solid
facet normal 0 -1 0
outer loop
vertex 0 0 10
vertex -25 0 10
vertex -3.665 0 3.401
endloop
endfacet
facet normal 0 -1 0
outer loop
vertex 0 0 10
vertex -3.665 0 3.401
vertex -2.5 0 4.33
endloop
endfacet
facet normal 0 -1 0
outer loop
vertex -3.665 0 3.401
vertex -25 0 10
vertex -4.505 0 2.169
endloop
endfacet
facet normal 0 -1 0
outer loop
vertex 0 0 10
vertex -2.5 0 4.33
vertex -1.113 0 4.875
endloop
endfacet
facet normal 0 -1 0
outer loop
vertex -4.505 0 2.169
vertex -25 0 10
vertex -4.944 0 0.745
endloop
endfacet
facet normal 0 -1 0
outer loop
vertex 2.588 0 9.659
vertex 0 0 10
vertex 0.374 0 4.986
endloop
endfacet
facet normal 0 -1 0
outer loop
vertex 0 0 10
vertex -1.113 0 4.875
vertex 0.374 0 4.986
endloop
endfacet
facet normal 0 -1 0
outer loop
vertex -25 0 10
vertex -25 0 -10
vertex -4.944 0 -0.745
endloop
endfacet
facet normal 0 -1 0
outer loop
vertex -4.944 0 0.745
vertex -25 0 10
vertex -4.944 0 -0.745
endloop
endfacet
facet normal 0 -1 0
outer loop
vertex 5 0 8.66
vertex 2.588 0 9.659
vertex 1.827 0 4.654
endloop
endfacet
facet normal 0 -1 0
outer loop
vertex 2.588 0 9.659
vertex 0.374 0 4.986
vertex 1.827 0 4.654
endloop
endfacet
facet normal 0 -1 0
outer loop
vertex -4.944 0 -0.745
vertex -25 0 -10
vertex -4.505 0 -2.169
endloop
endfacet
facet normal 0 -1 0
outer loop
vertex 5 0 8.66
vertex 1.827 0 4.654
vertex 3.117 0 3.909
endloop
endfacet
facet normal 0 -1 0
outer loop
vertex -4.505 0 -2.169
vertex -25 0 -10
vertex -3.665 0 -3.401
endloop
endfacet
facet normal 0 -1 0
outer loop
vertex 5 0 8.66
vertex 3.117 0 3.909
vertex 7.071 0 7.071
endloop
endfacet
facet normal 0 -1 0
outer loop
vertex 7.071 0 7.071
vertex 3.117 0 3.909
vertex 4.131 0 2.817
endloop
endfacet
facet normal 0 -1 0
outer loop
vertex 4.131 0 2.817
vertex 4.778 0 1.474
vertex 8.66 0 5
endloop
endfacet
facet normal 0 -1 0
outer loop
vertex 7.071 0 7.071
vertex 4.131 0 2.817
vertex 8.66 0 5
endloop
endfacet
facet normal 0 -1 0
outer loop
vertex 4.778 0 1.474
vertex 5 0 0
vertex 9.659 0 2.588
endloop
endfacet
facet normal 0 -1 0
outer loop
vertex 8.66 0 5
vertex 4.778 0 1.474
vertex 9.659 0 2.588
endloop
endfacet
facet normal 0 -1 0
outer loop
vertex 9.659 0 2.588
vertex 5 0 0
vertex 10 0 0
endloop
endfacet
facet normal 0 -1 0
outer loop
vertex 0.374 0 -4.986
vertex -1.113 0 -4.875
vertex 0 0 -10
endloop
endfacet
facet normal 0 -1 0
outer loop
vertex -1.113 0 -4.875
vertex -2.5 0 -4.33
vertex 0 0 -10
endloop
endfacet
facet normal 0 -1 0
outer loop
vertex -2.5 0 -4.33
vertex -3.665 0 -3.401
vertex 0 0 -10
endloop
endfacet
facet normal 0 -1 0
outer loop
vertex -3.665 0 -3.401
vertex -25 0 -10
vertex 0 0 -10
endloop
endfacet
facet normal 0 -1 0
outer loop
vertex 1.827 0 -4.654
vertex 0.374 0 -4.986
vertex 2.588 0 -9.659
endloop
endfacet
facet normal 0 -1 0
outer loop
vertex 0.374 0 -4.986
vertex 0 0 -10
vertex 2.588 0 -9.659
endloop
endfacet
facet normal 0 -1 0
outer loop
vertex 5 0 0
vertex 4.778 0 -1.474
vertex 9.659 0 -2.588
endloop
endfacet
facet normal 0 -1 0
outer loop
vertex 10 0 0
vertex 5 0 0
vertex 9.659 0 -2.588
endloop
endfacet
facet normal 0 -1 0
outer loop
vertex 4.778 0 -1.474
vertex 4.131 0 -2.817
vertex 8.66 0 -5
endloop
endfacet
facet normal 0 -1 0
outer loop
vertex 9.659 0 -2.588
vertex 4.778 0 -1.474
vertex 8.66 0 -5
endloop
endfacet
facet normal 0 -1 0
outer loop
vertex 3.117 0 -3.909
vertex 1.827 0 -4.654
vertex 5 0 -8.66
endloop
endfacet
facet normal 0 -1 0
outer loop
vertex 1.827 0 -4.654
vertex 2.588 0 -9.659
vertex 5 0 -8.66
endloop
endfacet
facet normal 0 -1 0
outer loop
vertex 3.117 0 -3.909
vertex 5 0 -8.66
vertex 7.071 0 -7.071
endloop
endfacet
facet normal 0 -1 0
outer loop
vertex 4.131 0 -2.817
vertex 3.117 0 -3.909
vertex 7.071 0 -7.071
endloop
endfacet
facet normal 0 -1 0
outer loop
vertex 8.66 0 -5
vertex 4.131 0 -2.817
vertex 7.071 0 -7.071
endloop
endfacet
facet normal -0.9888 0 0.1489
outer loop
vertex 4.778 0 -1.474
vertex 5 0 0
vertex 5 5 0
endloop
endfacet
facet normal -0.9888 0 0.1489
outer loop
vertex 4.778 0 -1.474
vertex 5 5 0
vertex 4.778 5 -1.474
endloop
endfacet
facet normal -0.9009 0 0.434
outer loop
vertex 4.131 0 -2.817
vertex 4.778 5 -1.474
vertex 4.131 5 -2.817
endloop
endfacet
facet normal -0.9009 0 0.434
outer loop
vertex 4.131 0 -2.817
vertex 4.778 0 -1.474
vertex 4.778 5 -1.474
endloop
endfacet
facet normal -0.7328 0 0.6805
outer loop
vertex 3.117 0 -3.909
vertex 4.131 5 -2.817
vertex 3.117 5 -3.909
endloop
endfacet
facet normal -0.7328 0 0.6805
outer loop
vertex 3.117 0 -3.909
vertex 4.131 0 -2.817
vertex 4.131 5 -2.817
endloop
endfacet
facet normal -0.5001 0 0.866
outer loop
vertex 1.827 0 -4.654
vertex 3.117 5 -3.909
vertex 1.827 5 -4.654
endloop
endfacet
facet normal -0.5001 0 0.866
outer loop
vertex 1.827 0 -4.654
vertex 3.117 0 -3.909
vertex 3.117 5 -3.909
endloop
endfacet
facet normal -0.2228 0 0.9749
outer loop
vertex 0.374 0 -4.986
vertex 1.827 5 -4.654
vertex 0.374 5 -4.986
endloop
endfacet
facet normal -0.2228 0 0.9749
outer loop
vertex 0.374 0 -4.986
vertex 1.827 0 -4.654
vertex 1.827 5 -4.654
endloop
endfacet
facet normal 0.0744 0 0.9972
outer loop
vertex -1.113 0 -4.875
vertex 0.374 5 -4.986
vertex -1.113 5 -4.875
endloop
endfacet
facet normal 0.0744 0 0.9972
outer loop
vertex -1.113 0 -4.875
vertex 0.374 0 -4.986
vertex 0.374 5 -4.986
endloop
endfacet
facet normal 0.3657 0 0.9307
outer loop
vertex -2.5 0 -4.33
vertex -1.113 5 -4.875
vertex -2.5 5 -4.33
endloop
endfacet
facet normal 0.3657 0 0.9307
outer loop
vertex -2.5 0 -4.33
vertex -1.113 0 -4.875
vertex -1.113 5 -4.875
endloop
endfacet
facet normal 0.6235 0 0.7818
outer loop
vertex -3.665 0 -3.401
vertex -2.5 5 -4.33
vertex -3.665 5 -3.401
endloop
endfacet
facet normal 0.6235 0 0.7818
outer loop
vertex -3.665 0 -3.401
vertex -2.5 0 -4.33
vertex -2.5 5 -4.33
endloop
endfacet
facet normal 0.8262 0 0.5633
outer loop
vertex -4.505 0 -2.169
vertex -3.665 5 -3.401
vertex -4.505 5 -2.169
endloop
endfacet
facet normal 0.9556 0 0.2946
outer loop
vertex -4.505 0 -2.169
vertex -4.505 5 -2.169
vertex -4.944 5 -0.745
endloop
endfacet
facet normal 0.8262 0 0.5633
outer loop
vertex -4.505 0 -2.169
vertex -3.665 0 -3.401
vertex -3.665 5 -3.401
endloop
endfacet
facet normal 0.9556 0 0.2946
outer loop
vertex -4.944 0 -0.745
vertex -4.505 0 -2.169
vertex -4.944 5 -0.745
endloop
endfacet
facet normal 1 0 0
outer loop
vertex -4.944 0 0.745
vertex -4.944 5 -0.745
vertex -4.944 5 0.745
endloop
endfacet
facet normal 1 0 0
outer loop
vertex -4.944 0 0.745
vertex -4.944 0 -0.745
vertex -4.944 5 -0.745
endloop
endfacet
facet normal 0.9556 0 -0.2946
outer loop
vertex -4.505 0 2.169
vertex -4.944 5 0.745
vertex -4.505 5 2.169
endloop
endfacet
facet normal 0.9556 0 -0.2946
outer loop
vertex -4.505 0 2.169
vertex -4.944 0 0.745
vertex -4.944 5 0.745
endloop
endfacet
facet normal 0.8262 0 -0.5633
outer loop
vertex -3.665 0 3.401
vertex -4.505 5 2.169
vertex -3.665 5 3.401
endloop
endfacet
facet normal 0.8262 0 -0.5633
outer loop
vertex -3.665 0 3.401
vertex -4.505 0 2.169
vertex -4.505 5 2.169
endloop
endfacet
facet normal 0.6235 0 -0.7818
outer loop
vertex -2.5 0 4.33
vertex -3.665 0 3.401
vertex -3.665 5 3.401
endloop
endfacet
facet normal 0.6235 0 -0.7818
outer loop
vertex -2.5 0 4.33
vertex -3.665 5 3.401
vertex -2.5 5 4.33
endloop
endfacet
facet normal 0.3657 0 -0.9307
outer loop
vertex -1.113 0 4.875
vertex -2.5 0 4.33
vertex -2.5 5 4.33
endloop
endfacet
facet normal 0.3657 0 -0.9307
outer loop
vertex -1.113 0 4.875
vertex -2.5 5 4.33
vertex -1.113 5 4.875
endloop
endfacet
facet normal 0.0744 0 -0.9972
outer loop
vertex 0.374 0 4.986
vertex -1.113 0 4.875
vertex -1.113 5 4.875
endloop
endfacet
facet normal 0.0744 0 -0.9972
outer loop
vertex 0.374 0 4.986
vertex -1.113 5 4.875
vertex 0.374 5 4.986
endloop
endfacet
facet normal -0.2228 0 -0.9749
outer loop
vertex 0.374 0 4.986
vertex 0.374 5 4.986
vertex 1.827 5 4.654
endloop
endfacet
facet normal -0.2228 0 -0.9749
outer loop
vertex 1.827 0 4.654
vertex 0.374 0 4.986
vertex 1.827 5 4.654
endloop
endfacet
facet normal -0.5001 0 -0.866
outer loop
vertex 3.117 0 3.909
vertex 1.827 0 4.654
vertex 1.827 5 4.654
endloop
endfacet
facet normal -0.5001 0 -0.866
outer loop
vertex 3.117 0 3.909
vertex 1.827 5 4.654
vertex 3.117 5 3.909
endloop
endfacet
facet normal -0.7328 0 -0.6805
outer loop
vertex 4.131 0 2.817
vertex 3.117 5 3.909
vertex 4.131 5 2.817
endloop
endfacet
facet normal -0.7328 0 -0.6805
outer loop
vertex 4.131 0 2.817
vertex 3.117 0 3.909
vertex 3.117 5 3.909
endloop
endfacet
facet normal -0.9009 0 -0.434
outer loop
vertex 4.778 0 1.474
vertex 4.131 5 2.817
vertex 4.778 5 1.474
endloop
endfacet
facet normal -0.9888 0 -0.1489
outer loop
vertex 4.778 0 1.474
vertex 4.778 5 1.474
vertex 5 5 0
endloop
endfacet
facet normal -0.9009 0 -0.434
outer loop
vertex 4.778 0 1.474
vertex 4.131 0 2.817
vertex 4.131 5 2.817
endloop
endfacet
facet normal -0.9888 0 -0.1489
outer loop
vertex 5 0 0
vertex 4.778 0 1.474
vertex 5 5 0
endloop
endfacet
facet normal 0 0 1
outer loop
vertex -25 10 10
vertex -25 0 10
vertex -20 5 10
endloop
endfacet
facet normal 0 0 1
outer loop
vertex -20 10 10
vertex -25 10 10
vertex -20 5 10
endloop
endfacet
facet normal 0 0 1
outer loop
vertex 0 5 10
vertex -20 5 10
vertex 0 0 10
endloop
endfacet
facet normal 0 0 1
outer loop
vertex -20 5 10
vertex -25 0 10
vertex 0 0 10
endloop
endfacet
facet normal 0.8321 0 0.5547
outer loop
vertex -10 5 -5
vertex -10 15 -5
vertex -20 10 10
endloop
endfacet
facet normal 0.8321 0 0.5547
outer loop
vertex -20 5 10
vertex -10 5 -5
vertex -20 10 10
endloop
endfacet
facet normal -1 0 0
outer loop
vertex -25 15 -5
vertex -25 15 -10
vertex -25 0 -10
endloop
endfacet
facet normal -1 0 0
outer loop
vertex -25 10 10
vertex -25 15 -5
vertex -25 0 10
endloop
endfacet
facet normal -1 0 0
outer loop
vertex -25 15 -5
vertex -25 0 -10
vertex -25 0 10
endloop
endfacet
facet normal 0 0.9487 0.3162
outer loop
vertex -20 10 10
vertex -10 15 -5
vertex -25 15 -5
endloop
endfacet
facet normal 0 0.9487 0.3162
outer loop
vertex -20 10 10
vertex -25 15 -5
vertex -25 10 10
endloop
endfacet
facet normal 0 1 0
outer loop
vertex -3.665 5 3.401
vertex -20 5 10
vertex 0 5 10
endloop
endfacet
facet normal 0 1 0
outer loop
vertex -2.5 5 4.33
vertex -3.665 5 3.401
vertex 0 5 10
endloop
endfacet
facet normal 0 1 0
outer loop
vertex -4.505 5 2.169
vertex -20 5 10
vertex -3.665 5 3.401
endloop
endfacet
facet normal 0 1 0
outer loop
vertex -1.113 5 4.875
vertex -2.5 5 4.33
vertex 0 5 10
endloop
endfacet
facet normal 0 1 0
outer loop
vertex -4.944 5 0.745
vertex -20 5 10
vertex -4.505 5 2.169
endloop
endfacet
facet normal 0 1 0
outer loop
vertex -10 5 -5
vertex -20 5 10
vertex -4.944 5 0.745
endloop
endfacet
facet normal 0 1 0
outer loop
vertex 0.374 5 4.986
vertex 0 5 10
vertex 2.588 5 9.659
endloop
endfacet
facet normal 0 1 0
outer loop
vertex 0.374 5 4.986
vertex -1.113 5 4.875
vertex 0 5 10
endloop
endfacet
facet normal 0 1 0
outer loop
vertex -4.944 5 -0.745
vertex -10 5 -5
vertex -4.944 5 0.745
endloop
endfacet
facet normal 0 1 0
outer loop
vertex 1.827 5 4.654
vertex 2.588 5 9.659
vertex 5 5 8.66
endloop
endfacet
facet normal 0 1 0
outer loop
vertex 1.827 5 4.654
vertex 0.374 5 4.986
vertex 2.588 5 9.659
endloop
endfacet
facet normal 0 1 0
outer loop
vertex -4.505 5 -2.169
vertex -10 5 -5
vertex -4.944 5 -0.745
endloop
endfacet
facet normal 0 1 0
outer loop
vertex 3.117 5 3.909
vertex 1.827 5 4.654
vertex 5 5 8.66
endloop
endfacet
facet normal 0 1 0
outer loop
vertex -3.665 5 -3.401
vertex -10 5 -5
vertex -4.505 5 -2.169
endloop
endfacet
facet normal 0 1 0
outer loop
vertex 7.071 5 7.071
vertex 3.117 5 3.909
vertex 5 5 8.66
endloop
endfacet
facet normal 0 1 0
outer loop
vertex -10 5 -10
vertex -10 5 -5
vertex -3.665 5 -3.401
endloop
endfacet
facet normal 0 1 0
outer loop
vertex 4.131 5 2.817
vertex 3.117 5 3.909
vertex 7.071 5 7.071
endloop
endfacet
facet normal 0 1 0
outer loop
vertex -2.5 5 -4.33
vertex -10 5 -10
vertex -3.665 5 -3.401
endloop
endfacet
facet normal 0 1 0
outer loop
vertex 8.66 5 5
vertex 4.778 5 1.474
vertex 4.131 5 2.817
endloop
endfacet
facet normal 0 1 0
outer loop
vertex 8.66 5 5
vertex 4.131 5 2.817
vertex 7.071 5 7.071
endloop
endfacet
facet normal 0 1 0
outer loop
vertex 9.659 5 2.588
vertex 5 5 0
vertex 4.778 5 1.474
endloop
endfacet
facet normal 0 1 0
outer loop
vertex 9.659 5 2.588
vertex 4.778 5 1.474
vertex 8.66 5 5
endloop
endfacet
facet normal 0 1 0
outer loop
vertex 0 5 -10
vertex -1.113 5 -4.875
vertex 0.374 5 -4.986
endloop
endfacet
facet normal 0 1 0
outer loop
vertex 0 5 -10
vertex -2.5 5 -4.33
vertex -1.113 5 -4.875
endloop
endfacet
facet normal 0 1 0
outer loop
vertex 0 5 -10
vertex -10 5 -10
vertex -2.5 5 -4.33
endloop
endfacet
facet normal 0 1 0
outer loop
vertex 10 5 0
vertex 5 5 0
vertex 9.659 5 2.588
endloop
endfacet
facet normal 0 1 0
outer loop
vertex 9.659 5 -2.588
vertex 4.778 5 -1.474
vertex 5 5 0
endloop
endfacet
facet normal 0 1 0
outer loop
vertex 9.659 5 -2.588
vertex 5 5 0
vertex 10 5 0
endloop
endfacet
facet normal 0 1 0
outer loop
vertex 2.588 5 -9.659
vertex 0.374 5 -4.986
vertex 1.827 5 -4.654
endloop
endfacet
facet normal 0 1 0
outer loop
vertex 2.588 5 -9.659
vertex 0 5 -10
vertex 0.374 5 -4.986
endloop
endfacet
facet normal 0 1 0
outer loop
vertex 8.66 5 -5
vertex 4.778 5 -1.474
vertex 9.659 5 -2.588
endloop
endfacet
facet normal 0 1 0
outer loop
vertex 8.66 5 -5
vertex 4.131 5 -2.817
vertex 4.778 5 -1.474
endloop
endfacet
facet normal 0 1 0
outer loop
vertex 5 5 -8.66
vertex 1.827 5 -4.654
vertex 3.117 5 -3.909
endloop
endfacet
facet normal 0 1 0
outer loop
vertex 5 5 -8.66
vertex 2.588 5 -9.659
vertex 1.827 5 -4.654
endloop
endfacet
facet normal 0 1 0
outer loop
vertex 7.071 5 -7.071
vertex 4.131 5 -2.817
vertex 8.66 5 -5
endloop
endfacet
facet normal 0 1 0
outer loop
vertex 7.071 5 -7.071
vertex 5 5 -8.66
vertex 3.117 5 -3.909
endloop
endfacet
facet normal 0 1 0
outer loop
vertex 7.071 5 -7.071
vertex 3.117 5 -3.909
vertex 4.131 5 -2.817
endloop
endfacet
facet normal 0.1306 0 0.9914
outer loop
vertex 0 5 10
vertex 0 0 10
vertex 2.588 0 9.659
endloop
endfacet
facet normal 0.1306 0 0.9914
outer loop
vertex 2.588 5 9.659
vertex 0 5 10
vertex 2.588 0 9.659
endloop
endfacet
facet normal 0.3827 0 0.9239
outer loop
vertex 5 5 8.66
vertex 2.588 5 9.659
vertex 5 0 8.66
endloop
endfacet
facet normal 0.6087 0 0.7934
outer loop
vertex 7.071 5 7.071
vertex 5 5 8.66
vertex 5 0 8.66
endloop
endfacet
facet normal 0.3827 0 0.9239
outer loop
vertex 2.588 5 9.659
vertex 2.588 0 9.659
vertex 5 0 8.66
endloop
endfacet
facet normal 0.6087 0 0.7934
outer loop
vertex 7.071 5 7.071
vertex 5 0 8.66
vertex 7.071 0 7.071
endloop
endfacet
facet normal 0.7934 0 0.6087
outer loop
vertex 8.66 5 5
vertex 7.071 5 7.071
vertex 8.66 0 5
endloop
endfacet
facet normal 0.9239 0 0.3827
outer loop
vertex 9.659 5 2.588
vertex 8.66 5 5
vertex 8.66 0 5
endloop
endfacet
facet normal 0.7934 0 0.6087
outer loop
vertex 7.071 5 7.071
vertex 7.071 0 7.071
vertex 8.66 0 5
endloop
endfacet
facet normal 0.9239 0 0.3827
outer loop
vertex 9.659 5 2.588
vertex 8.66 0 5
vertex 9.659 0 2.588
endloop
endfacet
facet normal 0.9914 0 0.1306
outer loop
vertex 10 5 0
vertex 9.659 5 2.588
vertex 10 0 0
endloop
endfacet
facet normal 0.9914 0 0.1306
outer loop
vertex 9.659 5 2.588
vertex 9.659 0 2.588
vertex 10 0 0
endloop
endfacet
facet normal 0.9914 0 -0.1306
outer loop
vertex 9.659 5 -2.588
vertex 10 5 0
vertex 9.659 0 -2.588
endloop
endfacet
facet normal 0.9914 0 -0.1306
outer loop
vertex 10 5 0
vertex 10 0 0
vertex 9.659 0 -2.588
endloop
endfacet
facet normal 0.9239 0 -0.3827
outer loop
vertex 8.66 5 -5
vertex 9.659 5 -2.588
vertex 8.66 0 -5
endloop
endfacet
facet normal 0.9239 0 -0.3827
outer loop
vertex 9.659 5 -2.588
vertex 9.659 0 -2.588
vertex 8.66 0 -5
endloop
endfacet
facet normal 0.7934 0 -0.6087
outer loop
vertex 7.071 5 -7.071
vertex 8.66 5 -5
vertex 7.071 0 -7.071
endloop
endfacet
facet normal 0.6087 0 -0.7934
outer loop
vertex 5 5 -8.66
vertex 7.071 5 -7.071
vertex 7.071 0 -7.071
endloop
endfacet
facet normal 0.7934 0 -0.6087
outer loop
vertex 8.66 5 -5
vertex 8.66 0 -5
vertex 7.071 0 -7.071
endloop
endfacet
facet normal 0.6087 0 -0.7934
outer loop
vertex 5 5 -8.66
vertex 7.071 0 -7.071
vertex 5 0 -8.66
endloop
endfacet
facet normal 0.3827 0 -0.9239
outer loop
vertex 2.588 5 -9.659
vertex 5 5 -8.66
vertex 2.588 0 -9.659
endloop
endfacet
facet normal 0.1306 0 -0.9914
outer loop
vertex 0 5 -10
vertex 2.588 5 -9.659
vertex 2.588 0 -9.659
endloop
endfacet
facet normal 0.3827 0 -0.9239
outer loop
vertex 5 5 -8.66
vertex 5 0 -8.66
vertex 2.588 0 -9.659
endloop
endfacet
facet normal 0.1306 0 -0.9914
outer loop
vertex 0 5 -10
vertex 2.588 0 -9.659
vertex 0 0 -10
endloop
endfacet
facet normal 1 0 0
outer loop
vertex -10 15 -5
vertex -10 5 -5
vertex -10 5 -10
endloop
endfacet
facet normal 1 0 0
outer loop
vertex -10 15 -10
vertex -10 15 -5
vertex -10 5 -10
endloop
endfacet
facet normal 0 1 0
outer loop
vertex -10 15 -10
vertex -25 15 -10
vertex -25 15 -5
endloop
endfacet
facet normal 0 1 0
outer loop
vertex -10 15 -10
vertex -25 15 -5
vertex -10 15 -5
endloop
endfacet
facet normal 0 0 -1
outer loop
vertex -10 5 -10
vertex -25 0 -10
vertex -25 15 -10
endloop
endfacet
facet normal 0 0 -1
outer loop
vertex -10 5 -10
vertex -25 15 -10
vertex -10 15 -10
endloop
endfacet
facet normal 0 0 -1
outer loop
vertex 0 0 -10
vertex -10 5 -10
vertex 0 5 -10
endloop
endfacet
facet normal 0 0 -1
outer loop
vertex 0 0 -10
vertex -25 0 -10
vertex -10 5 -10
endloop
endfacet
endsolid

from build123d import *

# Parameters (mm, degrees)
SKETCH_1_R          = 5
EXTRUDE_1_DEPTH     = 5
SKETCH_1_3_W        = 15
SKETCH_1_3_H        = 20
EXTRUDE_2_DEPTH     = 15
CUT_EXTRUDE_1_DEPTH = 15
CUT_EXTRUDE_2_DEPTH = 10


with BuildPart() as part:
    # 草圖1 → 填料-伸長1 (new body)
    with BuildSketch(Plane(origin=(0, 0, 0), x_dir=(1, 0, 0), z_dir=(0, 1, 0))):
        with BuildLine():
            ThreePointArc((0, -10), (10, 0), (0, 10))
            Line((0, 10), (-10, 10))
            Line((-10, 10), (-10, 5))
            Line((-10, 5), (-10, -10))
            Line((-10, -10), (0, -10))
        make_face()
        Circle(SKETCH_1_R, mode=Mode.SUBTRACT)
    extrude(amount=EXTRUDE_1_DEPTH)

    # 草圖1<3> → 填料-伸長2 (add)
    with BuildSketch(Plane(origin=(0, 0, 0), x_dir=(1, 0, 0), z_dir=(0, 1, 0))):
        with Locations((-17.5, 0)):
            Rectangle(SKETCH_1_3_W, SKETCH_1_3_H)
    extrude(amount=EXTRUDE_2_DEPTH)

    # 草圖3 → 除料-伸長1 (cut)
    with BuildSketch(Plane(origin=(-10, 0, 0), x_dir=(0, 0, -1), z_dir=(1, 0, 0))):
        Polygon((5, 15), (-10, 10), (-10, 15), align=None)
    extrude(amount=-CUT_EXTRUDE_1_DEPTH, mode=Mode.SUBTRACT)

    # 草圖2 → 除料-伸長2 (cut)
    with BuildSketch(Plane(origin=(0, 15, 0), x_dir=(1, 0, 0), z_dir=(0, 1, 0))):
        Polygon((-10, 5), (-20, -10), (-10, -10), align=None)
    extrude(amount=-CUT_EXTRUDE_2_DEPTH, mode=Mode.SUBTRACT)


solid = part.part
